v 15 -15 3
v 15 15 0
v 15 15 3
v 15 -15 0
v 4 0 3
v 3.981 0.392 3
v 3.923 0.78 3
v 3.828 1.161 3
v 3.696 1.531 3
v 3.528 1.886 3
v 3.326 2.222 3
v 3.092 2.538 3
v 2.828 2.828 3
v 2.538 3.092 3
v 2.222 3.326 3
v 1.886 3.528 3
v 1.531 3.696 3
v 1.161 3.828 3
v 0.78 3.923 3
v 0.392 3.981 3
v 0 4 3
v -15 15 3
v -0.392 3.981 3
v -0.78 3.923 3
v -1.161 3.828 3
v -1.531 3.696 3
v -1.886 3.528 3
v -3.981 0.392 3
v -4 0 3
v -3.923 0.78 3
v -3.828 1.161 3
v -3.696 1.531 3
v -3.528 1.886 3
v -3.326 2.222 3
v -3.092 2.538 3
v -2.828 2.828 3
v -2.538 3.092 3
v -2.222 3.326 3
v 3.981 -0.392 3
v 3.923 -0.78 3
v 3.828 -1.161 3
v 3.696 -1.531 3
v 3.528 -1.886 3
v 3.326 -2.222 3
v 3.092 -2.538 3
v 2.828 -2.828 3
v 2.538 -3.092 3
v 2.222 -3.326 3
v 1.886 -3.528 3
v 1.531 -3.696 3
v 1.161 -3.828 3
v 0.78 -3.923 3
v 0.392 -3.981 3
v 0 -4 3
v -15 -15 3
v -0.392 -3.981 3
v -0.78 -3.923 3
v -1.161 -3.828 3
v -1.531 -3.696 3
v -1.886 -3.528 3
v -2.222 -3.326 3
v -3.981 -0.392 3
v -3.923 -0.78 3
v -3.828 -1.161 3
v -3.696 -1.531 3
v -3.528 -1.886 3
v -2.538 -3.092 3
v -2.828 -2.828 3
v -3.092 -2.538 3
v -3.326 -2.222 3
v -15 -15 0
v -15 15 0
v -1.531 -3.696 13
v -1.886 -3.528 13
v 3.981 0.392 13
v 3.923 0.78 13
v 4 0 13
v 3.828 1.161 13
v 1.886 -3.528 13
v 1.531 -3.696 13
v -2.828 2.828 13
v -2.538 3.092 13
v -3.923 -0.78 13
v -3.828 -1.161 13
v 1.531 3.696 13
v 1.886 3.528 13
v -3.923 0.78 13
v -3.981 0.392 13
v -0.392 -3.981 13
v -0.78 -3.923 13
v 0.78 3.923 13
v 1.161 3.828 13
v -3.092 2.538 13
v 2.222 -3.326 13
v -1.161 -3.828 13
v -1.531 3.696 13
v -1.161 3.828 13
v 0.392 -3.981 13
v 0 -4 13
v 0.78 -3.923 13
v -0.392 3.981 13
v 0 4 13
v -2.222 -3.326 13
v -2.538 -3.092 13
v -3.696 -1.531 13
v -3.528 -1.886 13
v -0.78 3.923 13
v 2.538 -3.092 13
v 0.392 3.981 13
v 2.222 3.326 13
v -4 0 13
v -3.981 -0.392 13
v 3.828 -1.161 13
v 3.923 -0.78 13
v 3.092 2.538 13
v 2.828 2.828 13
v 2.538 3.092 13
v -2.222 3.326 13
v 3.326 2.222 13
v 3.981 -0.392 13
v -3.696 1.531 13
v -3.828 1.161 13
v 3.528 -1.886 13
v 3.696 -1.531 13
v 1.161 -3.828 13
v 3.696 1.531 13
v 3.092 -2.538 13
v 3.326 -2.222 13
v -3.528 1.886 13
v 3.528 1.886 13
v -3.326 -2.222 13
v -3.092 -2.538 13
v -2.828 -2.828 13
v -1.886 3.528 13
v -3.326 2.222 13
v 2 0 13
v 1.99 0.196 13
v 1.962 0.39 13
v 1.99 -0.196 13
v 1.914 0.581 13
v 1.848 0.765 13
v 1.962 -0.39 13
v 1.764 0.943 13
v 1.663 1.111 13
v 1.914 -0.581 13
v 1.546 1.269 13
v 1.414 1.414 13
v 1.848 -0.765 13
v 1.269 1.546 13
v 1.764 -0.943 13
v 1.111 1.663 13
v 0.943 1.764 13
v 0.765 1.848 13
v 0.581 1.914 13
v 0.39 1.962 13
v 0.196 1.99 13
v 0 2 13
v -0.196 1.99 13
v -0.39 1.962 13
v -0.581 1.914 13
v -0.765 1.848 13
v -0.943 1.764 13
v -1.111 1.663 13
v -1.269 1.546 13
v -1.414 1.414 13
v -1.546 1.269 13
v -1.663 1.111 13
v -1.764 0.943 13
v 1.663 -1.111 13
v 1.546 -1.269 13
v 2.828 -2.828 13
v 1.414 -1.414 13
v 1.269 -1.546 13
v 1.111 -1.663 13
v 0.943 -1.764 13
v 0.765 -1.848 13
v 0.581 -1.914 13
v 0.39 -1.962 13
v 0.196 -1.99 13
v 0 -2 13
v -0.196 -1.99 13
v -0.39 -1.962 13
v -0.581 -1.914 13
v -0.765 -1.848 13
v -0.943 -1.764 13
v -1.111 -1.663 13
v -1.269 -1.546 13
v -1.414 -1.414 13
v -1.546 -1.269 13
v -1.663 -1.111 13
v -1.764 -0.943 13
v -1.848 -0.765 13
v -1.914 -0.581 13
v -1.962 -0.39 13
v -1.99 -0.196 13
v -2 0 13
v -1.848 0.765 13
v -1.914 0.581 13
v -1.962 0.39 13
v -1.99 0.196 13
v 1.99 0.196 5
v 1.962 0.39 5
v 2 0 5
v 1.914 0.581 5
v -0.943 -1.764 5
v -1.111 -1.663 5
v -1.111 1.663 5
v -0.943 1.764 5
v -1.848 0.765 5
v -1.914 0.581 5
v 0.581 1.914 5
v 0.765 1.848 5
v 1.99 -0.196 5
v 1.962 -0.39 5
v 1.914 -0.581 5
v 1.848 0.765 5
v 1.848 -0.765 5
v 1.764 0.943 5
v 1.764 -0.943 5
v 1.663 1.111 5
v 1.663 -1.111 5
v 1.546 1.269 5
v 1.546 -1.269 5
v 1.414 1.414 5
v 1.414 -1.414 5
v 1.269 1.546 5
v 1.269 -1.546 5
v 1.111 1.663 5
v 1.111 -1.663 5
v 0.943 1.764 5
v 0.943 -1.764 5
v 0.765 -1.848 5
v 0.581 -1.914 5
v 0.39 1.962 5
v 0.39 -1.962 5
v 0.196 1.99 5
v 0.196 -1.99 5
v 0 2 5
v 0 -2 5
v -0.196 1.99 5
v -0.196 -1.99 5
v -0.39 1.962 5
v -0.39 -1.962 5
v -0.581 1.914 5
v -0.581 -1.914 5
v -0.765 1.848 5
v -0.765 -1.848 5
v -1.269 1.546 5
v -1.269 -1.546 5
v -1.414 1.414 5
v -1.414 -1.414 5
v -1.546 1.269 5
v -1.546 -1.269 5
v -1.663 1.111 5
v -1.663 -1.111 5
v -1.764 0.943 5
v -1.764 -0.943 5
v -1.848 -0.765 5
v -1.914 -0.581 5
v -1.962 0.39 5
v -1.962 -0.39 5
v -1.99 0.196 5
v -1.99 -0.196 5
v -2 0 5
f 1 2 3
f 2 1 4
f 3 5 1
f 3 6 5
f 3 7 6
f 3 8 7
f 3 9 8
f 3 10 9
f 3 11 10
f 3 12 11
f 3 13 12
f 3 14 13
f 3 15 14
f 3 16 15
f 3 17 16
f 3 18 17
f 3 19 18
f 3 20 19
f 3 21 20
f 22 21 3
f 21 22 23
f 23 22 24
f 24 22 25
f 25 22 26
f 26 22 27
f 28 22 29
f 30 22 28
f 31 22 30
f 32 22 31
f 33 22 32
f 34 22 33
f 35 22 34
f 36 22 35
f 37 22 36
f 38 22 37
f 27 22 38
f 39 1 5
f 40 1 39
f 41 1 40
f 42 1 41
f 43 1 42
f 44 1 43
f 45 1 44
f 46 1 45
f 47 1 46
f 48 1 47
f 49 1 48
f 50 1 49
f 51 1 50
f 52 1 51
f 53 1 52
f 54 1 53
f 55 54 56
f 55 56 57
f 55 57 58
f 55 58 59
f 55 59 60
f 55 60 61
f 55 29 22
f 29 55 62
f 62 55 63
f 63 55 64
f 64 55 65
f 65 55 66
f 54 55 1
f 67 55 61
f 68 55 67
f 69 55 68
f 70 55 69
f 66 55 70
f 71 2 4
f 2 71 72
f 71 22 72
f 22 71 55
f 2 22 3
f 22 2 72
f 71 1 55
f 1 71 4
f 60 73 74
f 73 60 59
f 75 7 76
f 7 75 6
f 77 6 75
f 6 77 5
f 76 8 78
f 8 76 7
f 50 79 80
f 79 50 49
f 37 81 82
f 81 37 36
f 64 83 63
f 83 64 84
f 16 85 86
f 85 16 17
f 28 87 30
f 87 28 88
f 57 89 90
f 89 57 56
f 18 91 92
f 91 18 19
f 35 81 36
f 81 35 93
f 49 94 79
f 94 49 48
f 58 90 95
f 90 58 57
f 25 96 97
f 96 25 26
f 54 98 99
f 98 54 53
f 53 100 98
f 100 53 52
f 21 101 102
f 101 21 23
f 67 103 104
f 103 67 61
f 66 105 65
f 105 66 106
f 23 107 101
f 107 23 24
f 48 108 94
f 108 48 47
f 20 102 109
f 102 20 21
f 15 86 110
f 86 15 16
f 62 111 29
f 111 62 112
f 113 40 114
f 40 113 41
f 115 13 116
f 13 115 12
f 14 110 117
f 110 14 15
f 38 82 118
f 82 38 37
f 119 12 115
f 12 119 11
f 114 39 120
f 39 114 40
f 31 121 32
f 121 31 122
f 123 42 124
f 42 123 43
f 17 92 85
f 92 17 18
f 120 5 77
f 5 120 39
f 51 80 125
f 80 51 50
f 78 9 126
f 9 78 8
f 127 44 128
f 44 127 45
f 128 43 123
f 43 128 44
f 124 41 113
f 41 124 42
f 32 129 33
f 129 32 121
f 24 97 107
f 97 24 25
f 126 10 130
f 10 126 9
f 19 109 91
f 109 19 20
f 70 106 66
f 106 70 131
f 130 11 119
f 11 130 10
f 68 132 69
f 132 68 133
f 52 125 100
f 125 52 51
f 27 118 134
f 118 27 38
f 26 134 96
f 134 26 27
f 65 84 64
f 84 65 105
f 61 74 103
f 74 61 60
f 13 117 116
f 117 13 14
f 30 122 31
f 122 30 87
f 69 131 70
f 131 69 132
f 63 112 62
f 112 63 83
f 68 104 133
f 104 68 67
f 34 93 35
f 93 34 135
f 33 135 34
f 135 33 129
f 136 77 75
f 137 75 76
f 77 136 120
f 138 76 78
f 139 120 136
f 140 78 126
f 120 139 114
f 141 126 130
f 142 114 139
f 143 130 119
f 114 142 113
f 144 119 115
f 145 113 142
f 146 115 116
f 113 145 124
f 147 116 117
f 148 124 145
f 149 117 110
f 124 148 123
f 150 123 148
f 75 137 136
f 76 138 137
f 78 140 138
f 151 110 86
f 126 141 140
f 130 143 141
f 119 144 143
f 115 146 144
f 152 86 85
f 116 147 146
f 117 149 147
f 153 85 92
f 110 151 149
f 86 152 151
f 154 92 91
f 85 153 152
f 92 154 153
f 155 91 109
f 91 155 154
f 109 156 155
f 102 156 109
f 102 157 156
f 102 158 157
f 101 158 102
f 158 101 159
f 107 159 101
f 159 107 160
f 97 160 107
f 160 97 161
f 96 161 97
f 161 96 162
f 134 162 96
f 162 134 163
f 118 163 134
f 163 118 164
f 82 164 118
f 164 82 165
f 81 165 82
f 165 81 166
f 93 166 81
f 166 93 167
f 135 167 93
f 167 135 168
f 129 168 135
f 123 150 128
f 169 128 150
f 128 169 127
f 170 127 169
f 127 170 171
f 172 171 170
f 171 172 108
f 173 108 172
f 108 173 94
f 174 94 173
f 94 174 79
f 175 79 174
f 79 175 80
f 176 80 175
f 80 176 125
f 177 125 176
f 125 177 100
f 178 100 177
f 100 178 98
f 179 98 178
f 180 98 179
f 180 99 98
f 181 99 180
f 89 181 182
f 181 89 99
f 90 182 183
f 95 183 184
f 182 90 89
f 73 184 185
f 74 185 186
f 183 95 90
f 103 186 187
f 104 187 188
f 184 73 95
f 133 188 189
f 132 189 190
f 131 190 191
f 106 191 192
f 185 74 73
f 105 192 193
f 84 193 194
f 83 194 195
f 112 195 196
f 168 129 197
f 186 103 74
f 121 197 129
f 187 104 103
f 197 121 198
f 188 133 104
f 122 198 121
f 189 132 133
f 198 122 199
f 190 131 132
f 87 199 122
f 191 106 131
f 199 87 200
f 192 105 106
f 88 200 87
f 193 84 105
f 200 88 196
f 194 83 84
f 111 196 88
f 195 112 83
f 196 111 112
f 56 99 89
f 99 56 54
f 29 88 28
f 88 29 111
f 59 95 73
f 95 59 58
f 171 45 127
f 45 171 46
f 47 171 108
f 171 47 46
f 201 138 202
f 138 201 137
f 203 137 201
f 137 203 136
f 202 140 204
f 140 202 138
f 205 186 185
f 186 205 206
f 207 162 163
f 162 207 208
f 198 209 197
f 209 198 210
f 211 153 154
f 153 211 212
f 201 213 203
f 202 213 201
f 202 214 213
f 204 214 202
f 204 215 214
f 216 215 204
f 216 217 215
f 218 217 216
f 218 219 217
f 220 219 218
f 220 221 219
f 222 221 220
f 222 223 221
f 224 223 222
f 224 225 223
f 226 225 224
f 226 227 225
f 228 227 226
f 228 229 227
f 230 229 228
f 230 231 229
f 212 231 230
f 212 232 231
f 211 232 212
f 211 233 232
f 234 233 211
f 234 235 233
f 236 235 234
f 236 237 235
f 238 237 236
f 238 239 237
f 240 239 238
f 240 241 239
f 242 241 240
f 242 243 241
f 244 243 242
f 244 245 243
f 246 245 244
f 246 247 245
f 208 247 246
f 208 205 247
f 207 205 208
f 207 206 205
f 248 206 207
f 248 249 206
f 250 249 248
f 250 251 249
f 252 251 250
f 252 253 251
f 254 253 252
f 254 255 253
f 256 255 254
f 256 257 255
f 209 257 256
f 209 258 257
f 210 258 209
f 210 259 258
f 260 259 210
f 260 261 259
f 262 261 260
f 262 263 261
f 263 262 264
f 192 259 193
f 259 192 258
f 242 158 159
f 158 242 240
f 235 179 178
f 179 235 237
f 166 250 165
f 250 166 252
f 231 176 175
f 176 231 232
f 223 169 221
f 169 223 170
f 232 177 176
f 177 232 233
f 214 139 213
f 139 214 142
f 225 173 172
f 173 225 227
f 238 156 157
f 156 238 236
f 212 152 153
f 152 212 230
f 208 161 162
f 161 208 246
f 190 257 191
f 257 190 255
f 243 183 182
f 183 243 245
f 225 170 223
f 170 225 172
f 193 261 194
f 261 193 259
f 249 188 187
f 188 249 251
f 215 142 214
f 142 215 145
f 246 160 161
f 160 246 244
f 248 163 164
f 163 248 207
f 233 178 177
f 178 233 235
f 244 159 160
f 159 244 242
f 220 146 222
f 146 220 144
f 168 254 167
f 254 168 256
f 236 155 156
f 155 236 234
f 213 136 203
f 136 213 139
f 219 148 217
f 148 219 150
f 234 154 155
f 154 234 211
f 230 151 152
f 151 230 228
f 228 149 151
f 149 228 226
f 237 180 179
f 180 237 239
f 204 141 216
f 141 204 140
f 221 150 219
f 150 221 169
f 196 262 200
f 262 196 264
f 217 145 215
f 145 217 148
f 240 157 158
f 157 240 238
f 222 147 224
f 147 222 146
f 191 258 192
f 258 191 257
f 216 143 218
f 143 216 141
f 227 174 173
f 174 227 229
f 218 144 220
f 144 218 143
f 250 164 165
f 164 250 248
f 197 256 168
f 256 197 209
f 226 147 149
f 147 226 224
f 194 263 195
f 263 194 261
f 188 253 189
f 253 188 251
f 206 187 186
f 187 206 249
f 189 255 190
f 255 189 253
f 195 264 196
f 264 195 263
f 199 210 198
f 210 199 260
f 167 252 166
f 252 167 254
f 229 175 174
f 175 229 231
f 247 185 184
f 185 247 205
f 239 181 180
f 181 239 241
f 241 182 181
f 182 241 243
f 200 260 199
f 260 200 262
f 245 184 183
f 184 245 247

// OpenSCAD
// Base plate with a boss bored for an M3 heat-set threaded insert.
plate_x = 30;
plate_y = 30;
plate_t = 3;
boss_d = 8;
boss_h = 10;
insert_hole_d = 4.0;
insert_depth = 8;

module boss_plate() {
    difference() {
        union() {
            translate([-plate_x / 2, -plate_y / 2, 0])
                cube([plate_x, plate_y, plate_t]);
            cylinder(h = plate_t + boss_h, d = boss_d, $fn = 64);
        }
        translate([0, 0, plate_t + boss_h - insert_depth])
            cylinder(h = insert_depth + 1, d = insert_hole_d, $fn = 64);
    }
}

boss_plate();
